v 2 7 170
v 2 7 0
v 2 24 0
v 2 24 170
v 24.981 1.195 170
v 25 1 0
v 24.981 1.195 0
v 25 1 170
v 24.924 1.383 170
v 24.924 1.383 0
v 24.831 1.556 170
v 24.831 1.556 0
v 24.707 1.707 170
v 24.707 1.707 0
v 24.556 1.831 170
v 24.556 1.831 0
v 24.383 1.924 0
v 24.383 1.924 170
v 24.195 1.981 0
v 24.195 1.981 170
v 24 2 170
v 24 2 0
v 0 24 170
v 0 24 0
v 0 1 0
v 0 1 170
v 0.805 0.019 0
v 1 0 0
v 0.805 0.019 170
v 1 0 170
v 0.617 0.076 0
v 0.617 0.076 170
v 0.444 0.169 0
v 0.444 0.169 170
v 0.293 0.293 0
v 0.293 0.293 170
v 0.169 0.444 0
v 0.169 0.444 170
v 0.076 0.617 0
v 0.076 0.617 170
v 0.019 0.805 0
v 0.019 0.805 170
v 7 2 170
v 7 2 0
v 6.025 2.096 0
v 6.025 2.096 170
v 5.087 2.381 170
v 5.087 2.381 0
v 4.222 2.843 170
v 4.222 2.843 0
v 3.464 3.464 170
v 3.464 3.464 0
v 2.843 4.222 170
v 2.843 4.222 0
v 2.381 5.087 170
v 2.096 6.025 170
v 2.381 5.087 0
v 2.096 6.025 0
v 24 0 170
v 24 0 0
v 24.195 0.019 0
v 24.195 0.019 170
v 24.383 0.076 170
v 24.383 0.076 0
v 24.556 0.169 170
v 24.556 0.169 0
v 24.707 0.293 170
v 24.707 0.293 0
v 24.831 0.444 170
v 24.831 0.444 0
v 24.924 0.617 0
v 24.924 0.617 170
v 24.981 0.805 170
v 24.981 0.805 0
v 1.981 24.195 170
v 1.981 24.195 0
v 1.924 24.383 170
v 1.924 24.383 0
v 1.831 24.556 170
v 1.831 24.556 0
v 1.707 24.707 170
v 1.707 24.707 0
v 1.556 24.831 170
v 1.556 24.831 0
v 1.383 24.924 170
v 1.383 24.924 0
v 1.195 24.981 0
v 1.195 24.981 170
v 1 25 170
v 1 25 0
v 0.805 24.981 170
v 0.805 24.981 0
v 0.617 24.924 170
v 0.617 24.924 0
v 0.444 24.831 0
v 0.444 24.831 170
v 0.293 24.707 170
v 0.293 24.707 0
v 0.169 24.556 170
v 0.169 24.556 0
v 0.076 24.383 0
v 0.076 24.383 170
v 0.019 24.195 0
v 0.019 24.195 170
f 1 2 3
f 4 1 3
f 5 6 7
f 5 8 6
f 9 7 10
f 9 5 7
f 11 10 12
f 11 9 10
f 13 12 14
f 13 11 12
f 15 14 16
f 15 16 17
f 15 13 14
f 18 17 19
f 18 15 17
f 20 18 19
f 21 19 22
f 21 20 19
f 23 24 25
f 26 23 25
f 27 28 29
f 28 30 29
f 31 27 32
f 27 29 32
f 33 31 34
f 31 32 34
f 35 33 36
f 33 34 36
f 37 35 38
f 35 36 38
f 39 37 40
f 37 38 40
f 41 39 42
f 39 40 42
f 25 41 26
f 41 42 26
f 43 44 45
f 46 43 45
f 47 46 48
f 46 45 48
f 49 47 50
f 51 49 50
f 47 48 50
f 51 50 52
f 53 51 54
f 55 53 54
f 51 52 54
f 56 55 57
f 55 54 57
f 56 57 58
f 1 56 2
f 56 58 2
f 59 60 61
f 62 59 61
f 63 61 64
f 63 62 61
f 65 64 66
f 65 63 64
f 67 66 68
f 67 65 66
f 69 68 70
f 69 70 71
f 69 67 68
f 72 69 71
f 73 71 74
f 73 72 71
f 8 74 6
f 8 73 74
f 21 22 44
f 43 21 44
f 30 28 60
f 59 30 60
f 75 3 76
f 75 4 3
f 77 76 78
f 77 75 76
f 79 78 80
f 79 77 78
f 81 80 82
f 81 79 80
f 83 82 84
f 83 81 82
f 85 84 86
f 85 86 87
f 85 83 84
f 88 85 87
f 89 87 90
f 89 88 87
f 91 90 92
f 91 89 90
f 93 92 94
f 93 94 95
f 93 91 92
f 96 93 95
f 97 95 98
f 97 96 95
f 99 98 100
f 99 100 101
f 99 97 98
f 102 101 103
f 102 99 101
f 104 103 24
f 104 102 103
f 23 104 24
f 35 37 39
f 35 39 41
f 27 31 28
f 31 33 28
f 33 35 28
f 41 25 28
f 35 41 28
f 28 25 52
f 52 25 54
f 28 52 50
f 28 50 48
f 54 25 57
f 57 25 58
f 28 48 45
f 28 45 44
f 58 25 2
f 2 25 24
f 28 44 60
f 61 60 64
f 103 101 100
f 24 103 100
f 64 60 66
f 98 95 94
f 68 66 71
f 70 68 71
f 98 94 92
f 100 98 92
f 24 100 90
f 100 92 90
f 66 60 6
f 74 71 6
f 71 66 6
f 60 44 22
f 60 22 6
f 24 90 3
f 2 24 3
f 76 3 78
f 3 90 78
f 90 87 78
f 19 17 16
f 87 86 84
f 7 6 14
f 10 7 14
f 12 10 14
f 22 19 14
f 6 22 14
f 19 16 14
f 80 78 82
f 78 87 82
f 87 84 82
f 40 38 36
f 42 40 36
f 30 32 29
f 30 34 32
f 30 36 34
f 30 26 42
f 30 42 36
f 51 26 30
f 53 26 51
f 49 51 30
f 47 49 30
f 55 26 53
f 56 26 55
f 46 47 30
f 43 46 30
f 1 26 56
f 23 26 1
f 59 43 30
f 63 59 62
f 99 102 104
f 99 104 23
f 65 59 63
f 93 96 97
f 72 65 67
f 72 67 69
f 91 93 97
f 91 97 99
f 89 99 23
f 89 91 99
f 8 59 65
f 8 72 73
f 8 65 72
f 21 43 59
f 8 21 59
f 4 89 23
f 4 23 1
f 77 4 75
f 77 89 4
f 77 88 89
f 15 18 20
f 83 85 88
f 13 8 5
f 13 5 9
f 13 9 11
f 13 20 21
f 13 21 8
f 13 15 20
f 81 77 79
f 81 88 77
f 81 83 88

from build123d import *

# Parameters (mm, degrees)
EXTRUDE_1_DEPTH = 170
FILLET_1_R      = 1


with BuildPart() as part:
    # 草图1 → 凸台-拉伸1 (new body)
    with BuildSketch(Plane.XY):
        with BuildLine():
            Line((0, 0), (25, 0))
            Line((25, 0), (25, 2))
            Line((25, 2), (7, 2))
            ThreePointArc((7, 2), (3.464466094, 3.464466094), (2, 7))
            Line((2, 7), (2, 25))
            Line((2, 25), (0, 25))
            Line((0, 25), (0, 0))
        make_face()
    extrude(amount=EXTRUDE_1_DEPTH)

    # 圆角1
    fillet_1_edges = [part.edges().sort_by_distance(p)[0] for p in [
        (0, 25, 85),
        (25, 2, 85),
        (25, 0, 85),
        (0, 0, 85),
        (2, 25, 85),
    ]]
    fillet(fillet_1_edges, radius=FILLET_1_R - 0.0001)  # a hair under: the kernel refuses the full size


solid = part.part
